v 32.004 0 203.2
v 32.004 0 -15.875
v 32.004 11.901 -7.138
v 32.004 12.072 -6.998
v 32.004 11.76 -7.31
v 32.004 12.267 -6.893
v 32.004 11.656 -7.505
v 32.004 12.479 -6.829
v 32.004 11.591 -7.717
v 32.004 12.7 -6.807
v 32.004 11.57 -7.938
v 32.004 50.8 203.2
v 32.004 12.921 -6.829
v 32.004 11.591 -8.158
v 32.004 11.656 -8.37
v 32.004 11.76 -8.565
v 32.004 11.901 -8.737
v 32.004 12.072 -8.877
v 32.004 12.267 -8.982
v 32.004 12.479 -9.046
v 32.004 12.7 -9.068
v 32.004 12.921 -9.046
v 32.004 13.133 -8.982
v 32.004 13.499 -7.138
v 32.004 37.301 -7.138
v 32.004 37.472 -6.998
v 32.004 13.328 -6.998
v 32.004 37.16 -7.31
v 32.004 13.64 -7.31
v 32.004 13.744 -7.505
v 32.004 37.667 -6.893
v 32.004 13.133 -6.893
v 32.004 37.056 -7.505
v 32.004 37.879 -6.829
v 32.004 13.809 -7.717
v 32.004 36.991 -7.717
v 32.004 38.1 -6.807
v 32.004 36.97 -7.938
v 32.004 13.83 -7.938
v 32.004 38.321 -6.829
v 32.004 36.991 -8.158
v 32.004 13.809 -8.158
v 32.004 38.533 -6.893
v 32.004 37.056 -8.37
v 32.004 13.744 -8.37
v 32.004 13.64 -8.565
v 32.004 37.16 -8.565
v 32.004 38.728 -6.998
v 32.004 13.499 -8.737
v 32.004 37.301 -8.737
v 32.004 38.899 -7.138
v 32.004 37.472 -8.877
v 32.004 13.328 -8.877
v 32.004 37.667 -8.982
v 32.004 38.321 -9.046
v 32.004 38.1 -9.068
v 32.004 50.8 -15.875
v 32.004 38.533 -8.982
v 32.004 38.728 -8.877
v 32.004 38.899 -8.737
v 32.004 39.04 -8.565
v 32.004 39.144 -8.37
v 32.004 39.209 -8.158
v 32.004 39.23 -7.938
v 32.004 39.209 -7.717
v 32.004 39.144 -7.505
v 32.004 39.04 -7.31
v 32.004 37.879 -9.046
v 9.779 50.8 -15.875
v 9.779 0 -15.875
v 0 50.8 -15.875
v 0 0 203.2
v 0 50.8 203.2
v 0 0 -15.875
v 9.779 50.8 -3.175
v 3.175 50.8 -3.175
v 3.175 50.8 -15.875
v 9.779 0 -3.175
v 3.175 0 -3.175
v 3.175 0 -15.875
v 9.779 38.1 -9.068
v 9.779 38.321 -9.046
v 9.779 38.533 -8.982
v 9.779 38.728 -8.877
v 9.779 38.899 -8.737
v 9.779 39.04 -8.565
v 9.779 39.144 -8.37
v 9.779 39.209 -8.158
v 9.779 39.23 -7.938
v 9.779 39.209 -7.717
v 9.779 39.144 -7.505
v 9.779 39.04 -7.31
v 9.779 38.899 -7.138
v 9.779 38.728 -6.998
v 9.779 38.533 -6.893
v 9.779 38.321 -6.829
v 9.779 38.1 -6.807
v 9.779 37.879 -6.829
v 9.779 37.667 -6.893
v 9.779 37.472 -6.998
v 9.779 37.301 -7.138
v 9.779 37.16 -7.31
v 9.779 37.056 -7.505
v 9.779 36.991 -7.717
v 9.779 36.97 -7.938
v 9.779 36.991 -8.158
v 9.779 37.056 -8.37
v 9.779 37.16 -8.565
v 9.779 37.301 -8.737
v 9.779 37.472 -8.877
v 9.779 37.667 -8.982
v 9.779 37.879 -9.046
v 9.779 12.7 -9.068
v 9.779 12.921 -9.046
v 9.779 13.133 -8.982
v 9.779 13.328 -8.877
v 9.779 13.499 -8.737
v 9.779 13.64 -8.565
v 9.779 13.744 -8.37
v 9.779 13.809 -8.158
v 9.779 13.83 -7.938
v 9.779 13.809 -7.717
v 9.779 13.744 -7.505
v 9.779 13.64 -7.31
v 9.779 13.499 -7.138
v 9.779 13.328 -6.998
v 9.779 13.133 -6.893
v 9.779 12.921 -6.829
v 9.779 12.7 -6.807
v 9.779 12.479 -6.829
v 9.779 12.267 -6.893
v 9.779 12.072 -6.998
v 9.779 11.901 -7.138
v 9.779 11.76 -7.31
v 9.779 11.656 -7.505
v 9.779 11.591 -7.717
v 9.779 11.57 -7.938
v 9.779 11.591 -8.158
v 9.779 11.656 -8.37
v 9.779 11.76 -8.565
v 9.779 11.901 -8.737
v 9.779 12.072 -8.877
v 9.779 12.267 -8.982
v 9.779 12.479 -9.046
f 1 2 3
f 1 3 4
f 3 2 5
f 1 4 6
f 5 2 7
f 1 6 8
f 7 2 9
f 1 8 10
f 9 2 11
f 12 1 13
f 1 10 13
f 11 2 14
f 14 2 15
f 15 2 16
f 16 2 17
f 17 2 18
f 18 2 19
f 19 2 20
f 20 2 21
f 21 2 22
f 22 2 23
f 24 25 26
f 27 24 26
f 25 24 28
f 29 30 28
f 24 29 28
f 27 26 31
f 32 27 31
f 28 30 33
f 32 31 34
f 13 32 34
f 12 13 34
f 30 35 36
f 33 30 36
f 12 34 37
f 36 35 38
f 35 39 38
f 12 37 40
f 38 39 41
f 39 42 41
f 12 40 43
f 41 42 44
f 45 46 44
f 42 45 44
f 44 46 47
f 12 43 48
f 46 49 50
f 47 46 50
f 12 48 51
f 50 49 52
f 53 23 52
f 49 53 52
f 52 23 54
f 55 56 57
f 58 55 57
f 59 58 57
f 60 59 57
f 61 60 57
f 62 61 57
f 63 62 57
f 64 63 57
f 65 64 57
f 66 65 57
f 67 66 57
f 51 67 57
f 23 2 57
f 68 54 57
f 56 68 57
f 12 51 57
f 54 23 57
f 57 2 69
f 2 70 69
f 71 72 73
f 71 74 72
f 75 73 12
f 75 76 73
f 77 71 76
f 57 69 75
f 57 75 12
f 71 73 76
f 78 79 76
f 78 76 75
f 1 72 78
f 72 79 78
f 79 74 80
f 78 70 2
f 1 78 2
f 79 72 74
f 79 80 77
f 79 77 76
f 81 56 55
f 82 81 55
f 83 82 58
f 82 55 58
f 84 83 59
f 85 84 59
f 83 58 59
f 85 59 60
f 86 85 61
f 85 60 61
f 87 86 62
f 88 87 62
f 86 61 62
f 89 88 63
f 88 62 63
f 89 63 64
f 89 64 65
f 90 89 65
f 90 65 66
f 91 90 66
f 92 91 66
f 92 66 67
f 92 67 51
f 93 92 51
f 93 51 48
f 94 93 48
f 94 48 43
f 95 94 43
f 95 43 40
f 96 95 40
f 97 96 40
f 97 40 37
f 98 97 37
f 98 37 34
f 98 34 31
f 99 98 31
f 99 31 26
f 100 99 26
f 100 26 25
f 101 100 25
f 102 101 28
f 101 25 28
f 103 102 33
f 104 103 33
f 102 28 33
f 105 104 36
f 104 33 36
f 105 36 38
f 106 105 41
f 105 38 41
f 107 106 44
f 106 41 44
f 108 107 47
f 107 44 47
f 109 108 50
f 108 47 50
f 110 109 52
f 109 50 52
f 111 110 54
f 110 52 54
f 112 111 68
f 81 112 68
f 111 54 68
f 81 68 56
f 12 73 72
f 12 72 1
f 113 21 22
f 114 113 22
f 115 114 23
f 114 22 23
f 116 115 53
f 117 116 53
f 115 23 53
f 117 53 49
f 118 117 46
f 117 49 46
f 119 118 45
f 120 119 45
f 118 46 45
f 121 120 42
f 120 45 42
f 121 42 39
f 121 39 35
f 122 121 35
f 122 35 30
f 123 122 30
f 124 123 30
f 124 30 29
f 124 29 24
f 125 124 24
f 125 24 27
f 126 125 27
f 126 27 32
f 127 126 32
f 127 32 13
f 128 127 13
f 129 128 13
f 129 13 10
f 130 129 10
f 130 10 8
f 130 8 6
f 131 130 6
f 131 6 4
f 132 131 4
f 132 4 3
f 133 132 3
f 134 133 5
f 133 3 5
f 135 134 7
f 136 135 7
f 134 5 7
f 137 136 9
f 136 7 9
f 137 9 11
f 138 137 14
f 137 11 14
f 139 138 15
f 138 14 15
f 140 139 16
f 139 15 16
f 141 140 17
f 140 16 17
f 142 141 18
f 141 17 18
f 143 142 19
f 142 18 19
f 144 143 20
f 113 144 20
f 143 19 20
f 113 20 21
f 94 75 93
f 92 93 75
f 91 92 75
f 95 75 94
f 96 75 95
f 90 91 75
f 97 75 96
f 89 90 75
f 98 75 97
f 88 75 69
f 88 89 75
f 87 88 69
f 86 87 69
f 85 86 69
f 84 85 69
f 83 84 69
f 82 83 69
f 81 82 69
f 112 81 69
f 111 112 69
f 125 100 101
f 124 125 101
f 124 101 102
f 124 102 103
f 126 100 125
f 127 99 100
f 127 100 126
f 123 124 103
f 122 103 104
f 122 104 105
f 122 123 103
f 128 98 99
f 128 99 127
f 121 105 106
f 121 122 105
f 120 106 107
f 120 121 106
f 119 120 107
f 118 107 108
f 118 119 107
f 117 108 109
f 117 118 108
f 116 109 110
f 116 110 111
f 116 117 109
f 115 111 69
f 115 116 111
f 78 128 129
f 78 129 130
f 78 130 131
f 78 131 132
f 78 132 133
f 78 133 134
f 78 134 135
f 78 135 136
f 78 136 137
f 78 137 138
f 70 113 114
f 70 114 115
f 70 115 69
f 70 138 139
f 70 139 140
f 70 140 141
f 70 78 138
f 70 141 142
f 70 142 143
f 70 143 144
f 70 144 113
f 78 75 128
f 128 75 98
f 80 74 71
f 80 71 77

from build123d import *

# Parameters (mm, degrees)
BOSS_EXTRUDE1_DEPTH        = 50.8
SKETCH5_W                  = 15.875
SKETCH5_H                  = 50.8
BOSS_EXTRUDE2_DEPTH        = 19.05
F_4_40_TAPPED_HOLE1_REACH  = 64.104
F_4_40_TAPPED_HOLE1_BORE_R = 1.1303
SKETCH9_W                  = 32.004
SKETCH9_H                  = 50.8
BOSS_EXTRUDE4_DEPTH        = 203.2


with BuildPart() as part:
    # Sketch2 → Boss-Extrude1 (new body)
    with BuildSketch(Plane(origin=(0, 0, 0), x_dir=(1, 0, 0), z_dir=(0, 1, 0))):
        Polygon((0, 0), (0, 15.875), (3.175, 15.875), (3.175, 3.175), (9.779, 3.175), (9.779, 15.875), (12.954, 15.875), (12.954, 0), align=None)
    extrude(amount=BOSS_EXTRUDE1_DEPTH)

    # Sketch5 → Boss-Extrude2 (add)
    with BuildSketch(Plane(origin=(12.954, 0, 0), x_dir=(0, 0, -1), z_dir=(1, 0, 0))):
        with Locations((7.9375, 25.4)):
            Rectangle(SKETCH5_W, SKETCH5_H)
    extrude(amount=BOSS_EXTRUDE2_DEPTH)

    # #4-40 Tapped Hole1 bore → #4-40 Tapped Hole1 (cut, up to next)
    with BuildSketch(Plane(origin=(32.004, 0, 0), x_dir=(0, 0, -1), z_dir=(1, 0, 0)), mode=Mode.PRIVATE) as f_4_40_tapped_hole1_sk1:
        with Locations((7.9375, 12.7)):
            Circle(F_4_40_TAPPED_HOLE1_BORE_R)
    f_4_40_tapped_hole1_tool1 = extrude(f_4_40_tapped_hole1_sk1.sketch, amount=-F_4_40_TAPPED_HOLE1_REACH, mode=Mode.PRIVATE) & part.part
    # #4-40 Tapped Hole1 bore → #4-40 Tapped Hole1 (cut, up to next)
    with BuildSketch(Plane(origin=(32.004, 0, 0), x_dir=(0, 0, -1), z_dir=(1, 0, 0)), mode=Mode.PRIVATE) as f_4_40_tapped_hole1_sk2:
        with Locations((7.9375, 38.1)):
            Circle(F_4_40_TAPPED_HOLE1_BORE_R)
    f_4_40_tapped_hole1_tool2 = extrude(f_4_40_tapped_hole1_sk2.sketch, amount=-F_4_40_TAPPED_HOLE1_REACH, mode=Mode.PRIVATE) & part.part
    add(f_4_40_tapped_hole1_tool1.solids().sort_by_distance((32.004, 12.7, -7.9375))[0], mode=Mode.SUBTRACT)
    add(f_4_40_tapped_hole1_tool2.solids().sort_by_distance((32.004, 38.1, -7.9375))[0], mode=Mode.SUBTRACT)

    # Sketch9 → Boss-Extrude4 (add)
    with BuildSketch(Plane.XY):
        with Locations((16.002, 25.4)):
            Rectangle(SKETCH9_W, SKETCH9_H)
    extrude(amount=BOSS_EXTRUDE4_DEPTH)


solid = part.part
